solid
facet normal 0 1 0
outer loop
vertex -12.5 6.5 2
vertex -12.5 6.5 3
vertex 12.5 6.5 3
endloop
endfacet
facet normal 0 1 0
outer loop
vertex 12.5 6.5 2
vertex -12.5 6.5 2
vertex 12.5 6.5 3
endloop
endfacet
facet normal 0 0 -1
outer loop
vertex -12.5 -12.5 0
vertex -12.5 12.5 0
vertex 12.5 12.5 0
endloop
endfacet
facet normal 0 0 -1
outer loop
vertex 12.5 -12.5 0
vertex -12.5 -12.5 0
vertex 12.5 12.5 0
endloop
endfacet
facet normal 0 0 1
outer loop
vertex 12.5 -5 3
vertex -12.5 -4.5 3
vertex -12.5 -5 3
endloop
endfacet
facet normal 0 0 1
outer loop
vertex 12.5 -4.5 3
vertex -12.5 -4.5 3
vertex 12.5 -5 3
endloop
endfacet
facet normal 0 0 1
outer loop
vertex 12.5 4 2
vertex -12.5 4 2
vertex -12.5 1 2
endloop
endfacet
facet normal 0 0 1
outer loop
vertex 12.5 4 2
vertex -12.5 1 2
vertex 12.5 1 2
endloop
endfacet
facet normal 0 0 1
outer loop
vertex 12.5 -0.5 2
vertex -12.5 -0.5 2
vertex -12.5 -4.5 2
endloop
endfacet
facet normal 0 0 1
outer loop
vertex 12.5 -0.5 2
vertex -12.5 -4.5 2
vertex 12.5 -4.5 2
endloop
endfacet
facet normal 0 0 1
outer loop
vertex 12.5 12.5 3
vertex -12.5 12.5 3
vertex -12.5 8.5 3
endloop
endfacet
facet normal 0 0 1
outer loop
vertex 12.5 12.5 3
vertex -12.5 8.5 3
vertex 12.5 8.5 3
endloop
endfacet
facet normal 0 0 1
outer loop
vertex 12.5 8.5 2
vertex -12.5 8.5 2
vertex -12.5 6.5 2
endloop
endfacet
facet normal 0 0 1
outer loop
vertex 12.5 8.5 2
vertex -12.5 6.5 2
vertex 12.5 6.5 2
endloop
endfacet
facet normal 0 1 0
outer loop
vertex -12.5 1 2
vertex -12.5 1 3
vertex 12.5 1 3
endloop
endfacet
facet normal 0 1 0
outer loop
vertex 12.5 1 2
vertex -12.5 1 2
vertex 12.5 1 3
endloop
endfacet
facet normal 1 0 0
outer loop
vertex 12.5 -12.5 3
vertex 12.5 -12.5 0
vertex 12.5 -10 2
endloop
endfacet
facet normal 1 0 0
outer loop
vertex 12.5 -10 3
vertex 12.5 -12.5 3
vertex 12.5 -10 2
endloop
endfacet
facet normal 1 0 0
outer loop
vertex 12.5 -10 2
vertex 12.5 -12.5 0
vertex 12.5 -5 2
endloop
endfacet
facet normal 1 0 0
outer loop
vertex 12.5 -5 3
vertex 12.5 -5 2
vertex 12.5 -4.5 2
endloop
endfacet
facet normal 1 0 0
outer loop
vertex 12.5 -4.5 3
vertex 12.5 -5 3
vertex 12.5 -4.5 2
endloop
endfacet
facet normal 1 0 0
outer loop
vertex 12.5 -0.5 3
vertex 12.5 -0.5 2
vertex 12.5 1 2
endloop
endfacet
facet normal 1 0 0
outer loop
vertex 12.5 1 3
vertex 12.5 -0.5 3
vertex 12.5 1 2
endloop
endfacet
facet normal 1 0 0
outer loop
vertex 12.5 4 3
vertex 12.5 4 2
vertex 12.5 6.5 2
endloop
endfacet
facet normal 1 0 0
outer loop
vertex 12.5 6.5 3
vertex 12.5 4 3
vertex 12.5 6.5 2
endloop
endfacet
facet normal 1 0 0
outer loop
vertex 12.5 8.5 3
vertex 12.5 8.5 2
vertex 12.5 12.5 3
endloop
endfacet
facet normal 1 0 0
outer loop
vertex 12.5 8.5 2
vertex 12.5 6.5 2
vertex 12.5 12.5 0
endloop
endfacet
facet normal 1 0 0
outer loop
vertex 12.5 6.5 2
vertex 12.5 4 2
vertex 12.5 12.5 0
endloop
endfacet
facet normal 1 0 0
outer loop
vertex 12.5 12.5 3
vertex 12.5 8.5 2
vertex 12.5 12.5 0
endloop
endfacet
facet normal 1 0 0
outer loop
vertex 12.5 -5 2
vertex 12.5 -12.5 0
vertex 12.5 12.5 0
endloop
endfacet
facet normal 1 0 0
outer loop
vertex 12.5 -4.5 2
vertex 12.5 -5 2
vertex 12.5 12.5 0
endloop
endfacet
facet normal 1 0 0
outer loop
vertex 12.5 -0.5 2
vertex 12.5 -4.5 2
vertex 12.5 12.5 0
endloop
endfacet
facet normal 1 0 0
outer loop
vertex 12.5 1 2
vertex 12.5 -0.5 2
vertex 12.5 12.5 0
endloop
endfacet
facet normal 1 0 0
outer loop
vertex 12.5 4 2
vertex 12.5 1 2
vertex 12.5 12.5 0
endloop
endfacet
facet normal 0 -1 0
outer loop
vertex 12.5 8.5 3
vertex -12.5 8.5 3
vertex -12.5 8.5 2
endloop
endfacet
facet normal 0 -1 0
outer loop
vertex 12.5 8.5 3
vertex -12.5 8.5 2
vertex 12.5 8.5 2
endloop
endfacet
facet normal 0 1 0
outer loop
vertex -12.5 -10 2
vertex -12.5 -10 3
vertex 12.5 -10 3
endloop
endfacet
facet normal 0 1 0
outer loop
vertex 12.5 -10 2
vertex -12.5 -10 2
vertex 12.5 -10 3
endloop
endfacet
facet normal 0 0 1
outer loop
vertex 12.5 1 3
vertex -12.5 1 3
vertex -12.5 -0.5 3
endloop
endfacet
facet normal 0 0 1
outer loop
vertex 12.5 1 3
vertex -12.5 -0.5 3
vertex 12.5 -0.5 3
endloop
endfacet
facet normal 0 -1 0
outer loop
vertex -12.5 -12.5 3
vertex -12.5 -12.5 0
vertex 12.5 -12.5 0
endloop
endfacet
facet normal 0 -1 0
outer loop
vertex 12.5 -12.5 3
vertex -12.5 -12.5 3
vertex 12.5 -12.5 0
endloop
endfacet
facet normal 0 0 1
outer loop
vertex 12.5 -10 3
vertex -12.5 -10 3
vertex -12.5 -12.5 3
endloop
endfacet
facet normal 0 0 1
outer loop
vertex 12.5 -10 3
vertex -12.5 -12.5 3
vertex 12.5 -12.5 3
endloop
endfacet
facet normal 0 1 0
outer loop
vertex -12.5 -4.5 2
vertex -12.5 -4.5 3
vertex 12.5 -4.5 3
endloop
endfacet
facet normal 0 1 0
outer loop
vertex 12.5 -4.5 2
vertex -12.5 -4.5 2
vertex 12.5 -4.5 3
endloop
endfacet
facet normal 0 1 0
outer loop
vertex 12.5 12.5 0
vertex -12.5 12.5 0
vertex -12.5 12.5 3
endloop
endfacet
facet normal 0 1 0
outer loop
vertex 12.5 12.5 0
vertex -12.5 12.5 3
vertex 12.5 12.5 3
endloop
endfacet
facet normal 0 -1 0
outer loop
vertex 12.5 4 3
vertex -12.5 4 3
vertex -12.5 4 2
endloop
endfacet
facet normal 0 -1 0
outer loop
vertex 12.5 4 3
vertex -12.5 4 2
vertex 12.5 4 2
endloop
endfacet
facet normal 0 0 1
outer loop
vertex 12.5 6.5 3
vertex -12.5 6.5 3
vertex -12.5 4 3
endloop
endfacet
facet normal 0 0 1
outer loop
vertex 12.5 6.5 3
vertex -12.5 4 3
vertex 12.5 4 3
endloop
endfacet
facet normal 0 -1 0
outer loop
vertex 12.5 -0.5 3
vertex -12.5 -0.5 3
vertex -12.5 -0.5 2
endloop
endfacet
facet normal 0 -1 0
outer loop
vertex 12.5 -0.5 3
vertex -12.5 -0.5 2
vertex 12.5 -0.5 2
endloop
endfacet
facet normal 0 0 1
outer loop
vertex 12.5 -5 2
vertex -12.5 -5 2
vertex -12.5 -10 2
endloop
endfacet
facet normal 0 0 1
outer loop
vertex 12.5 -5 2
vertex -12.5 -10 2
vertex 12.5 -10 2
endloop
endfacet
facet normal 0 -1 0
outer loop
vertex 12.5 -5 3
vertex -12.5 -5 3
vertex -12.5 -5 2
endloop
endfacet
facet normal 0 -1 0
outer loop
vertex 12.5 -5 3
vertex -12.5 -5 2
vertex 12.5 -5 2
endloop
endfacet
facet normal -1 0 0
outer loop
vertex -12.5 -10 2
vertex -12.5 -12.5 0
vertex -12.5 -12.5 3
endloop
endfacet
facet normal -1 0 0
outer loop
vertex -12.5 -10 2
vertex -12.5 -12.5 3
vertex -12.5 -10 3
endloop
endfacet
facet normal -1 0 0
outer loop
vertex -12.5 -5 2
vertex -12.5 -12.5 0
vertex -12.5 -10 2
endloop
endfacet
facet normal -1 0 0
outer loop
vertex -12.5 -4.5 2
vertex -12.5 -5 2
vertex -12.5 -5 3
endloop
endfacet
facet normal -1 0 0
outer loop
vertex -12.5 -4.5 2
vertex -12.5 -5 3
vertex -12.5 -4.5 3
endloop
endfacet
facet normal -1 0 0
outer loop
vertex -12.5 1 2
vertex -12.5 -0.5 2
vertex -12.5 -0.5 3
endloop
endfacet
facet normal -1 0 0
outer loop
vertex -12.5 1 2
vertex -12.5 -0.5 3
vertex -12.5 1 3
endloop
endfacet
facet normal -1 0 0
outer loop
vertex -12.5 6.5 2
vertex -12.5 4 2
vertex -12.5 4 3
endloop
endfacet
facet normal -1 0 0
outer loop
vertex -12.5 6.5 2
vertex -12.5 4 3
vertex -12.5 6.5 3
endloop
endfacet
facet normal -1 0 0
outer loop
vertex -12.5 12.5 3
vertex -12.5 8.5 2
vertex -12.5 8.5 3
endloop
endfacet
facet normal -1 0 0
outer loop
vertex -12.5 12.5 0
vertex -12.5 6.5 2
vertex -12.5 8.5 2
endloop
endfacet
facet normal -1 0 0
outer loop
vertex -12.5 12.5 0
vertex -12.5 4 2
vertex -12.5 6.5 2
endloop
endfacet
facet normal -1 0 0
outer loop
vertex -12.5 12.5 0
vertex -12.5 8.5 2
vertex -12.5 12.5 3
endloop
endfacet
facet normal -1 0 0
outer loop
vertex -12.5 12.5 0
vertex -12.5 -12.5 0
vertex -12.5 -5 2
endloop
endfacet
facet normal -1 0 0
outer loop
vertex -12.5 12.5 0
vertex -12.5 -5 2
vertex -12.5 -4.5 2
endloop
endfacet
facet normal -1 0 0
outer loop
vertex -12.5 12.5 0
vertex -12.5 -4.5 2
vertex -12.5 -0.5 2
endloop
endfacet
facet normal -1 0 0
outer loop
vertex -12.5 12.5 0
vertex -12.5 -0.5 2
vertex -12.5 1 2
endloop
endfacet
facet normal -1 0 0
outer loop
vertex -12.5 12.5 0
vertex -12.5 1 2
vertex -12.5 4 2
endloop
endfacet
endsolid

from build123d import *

# Parameters (mm, degrees)
F0_W     = 25
F0_H     = 25
F1_DEPTH = 3
F2_W     = 25
F2_H     = 2
F3_DEPTH = 1
F2_H_2   = 3
F2_H_3   = 4
F2_H_4   = 5


with BuildPart() as f1:
    # F0 (on Top) → F1 (new body)
    with BuildSketch(Plane.XY):
        Rectangle(F0_W, F0_H)
    extrude(amount=F1_DEPTH)


with BuildPart() as f3:
    # F2 (on face) → F3 (new body)
    with BuildSketch(Plane.XY.offset(3)):
        with Locations((0, 7.5)):
            Rectangle(F2_W, F2_H)
    extrude(amount=-F3_DEPTH)


with BuildPart() as f3b:
    # F2 (on face) → F3, piece 2 (new body)
    with BuildSketch(Plane.XY.offset(3)):
        with Locations((0, 2.5)):
            Rectangle(F2_W, F2_H_2)
    extrude(amount=-F3_DEPTH)


with BuildPart() as f3c:
    # F2 (on face) → F3, piece 3 (new body)
    with BuildSketch(Plane.XY.offset(3)):
        with Locations((0, -2.5)):
            Rectangle(F2_W, F2_H_3)
    extrude(amount=-F3_DEPTH)


with BuildPart() as f3d:
    # F2 (on face) → F3, piece 4 (new body)
    with BuildSketch(Plane.XY.offset(3)):
        with Locations((0, -7.5)):
            Rectangle(F2_W, F2_H_4)
    extrude(amount=-F3_DEPTH)


with BuildPart() as f1_1:
    add(f1.part)

    # F4: cut F3, F3b, F3c, F3d
    add(f3.part, mode=Mode.SUBTRACT)
    add(f3b.part, mode=Mode.SUBTRACT)
    add(f3c.part, mode=Mode.SUBTRACT)
    add(f3d.part, mode=Mode.SUBTRACT)


solid = f1_1.part
